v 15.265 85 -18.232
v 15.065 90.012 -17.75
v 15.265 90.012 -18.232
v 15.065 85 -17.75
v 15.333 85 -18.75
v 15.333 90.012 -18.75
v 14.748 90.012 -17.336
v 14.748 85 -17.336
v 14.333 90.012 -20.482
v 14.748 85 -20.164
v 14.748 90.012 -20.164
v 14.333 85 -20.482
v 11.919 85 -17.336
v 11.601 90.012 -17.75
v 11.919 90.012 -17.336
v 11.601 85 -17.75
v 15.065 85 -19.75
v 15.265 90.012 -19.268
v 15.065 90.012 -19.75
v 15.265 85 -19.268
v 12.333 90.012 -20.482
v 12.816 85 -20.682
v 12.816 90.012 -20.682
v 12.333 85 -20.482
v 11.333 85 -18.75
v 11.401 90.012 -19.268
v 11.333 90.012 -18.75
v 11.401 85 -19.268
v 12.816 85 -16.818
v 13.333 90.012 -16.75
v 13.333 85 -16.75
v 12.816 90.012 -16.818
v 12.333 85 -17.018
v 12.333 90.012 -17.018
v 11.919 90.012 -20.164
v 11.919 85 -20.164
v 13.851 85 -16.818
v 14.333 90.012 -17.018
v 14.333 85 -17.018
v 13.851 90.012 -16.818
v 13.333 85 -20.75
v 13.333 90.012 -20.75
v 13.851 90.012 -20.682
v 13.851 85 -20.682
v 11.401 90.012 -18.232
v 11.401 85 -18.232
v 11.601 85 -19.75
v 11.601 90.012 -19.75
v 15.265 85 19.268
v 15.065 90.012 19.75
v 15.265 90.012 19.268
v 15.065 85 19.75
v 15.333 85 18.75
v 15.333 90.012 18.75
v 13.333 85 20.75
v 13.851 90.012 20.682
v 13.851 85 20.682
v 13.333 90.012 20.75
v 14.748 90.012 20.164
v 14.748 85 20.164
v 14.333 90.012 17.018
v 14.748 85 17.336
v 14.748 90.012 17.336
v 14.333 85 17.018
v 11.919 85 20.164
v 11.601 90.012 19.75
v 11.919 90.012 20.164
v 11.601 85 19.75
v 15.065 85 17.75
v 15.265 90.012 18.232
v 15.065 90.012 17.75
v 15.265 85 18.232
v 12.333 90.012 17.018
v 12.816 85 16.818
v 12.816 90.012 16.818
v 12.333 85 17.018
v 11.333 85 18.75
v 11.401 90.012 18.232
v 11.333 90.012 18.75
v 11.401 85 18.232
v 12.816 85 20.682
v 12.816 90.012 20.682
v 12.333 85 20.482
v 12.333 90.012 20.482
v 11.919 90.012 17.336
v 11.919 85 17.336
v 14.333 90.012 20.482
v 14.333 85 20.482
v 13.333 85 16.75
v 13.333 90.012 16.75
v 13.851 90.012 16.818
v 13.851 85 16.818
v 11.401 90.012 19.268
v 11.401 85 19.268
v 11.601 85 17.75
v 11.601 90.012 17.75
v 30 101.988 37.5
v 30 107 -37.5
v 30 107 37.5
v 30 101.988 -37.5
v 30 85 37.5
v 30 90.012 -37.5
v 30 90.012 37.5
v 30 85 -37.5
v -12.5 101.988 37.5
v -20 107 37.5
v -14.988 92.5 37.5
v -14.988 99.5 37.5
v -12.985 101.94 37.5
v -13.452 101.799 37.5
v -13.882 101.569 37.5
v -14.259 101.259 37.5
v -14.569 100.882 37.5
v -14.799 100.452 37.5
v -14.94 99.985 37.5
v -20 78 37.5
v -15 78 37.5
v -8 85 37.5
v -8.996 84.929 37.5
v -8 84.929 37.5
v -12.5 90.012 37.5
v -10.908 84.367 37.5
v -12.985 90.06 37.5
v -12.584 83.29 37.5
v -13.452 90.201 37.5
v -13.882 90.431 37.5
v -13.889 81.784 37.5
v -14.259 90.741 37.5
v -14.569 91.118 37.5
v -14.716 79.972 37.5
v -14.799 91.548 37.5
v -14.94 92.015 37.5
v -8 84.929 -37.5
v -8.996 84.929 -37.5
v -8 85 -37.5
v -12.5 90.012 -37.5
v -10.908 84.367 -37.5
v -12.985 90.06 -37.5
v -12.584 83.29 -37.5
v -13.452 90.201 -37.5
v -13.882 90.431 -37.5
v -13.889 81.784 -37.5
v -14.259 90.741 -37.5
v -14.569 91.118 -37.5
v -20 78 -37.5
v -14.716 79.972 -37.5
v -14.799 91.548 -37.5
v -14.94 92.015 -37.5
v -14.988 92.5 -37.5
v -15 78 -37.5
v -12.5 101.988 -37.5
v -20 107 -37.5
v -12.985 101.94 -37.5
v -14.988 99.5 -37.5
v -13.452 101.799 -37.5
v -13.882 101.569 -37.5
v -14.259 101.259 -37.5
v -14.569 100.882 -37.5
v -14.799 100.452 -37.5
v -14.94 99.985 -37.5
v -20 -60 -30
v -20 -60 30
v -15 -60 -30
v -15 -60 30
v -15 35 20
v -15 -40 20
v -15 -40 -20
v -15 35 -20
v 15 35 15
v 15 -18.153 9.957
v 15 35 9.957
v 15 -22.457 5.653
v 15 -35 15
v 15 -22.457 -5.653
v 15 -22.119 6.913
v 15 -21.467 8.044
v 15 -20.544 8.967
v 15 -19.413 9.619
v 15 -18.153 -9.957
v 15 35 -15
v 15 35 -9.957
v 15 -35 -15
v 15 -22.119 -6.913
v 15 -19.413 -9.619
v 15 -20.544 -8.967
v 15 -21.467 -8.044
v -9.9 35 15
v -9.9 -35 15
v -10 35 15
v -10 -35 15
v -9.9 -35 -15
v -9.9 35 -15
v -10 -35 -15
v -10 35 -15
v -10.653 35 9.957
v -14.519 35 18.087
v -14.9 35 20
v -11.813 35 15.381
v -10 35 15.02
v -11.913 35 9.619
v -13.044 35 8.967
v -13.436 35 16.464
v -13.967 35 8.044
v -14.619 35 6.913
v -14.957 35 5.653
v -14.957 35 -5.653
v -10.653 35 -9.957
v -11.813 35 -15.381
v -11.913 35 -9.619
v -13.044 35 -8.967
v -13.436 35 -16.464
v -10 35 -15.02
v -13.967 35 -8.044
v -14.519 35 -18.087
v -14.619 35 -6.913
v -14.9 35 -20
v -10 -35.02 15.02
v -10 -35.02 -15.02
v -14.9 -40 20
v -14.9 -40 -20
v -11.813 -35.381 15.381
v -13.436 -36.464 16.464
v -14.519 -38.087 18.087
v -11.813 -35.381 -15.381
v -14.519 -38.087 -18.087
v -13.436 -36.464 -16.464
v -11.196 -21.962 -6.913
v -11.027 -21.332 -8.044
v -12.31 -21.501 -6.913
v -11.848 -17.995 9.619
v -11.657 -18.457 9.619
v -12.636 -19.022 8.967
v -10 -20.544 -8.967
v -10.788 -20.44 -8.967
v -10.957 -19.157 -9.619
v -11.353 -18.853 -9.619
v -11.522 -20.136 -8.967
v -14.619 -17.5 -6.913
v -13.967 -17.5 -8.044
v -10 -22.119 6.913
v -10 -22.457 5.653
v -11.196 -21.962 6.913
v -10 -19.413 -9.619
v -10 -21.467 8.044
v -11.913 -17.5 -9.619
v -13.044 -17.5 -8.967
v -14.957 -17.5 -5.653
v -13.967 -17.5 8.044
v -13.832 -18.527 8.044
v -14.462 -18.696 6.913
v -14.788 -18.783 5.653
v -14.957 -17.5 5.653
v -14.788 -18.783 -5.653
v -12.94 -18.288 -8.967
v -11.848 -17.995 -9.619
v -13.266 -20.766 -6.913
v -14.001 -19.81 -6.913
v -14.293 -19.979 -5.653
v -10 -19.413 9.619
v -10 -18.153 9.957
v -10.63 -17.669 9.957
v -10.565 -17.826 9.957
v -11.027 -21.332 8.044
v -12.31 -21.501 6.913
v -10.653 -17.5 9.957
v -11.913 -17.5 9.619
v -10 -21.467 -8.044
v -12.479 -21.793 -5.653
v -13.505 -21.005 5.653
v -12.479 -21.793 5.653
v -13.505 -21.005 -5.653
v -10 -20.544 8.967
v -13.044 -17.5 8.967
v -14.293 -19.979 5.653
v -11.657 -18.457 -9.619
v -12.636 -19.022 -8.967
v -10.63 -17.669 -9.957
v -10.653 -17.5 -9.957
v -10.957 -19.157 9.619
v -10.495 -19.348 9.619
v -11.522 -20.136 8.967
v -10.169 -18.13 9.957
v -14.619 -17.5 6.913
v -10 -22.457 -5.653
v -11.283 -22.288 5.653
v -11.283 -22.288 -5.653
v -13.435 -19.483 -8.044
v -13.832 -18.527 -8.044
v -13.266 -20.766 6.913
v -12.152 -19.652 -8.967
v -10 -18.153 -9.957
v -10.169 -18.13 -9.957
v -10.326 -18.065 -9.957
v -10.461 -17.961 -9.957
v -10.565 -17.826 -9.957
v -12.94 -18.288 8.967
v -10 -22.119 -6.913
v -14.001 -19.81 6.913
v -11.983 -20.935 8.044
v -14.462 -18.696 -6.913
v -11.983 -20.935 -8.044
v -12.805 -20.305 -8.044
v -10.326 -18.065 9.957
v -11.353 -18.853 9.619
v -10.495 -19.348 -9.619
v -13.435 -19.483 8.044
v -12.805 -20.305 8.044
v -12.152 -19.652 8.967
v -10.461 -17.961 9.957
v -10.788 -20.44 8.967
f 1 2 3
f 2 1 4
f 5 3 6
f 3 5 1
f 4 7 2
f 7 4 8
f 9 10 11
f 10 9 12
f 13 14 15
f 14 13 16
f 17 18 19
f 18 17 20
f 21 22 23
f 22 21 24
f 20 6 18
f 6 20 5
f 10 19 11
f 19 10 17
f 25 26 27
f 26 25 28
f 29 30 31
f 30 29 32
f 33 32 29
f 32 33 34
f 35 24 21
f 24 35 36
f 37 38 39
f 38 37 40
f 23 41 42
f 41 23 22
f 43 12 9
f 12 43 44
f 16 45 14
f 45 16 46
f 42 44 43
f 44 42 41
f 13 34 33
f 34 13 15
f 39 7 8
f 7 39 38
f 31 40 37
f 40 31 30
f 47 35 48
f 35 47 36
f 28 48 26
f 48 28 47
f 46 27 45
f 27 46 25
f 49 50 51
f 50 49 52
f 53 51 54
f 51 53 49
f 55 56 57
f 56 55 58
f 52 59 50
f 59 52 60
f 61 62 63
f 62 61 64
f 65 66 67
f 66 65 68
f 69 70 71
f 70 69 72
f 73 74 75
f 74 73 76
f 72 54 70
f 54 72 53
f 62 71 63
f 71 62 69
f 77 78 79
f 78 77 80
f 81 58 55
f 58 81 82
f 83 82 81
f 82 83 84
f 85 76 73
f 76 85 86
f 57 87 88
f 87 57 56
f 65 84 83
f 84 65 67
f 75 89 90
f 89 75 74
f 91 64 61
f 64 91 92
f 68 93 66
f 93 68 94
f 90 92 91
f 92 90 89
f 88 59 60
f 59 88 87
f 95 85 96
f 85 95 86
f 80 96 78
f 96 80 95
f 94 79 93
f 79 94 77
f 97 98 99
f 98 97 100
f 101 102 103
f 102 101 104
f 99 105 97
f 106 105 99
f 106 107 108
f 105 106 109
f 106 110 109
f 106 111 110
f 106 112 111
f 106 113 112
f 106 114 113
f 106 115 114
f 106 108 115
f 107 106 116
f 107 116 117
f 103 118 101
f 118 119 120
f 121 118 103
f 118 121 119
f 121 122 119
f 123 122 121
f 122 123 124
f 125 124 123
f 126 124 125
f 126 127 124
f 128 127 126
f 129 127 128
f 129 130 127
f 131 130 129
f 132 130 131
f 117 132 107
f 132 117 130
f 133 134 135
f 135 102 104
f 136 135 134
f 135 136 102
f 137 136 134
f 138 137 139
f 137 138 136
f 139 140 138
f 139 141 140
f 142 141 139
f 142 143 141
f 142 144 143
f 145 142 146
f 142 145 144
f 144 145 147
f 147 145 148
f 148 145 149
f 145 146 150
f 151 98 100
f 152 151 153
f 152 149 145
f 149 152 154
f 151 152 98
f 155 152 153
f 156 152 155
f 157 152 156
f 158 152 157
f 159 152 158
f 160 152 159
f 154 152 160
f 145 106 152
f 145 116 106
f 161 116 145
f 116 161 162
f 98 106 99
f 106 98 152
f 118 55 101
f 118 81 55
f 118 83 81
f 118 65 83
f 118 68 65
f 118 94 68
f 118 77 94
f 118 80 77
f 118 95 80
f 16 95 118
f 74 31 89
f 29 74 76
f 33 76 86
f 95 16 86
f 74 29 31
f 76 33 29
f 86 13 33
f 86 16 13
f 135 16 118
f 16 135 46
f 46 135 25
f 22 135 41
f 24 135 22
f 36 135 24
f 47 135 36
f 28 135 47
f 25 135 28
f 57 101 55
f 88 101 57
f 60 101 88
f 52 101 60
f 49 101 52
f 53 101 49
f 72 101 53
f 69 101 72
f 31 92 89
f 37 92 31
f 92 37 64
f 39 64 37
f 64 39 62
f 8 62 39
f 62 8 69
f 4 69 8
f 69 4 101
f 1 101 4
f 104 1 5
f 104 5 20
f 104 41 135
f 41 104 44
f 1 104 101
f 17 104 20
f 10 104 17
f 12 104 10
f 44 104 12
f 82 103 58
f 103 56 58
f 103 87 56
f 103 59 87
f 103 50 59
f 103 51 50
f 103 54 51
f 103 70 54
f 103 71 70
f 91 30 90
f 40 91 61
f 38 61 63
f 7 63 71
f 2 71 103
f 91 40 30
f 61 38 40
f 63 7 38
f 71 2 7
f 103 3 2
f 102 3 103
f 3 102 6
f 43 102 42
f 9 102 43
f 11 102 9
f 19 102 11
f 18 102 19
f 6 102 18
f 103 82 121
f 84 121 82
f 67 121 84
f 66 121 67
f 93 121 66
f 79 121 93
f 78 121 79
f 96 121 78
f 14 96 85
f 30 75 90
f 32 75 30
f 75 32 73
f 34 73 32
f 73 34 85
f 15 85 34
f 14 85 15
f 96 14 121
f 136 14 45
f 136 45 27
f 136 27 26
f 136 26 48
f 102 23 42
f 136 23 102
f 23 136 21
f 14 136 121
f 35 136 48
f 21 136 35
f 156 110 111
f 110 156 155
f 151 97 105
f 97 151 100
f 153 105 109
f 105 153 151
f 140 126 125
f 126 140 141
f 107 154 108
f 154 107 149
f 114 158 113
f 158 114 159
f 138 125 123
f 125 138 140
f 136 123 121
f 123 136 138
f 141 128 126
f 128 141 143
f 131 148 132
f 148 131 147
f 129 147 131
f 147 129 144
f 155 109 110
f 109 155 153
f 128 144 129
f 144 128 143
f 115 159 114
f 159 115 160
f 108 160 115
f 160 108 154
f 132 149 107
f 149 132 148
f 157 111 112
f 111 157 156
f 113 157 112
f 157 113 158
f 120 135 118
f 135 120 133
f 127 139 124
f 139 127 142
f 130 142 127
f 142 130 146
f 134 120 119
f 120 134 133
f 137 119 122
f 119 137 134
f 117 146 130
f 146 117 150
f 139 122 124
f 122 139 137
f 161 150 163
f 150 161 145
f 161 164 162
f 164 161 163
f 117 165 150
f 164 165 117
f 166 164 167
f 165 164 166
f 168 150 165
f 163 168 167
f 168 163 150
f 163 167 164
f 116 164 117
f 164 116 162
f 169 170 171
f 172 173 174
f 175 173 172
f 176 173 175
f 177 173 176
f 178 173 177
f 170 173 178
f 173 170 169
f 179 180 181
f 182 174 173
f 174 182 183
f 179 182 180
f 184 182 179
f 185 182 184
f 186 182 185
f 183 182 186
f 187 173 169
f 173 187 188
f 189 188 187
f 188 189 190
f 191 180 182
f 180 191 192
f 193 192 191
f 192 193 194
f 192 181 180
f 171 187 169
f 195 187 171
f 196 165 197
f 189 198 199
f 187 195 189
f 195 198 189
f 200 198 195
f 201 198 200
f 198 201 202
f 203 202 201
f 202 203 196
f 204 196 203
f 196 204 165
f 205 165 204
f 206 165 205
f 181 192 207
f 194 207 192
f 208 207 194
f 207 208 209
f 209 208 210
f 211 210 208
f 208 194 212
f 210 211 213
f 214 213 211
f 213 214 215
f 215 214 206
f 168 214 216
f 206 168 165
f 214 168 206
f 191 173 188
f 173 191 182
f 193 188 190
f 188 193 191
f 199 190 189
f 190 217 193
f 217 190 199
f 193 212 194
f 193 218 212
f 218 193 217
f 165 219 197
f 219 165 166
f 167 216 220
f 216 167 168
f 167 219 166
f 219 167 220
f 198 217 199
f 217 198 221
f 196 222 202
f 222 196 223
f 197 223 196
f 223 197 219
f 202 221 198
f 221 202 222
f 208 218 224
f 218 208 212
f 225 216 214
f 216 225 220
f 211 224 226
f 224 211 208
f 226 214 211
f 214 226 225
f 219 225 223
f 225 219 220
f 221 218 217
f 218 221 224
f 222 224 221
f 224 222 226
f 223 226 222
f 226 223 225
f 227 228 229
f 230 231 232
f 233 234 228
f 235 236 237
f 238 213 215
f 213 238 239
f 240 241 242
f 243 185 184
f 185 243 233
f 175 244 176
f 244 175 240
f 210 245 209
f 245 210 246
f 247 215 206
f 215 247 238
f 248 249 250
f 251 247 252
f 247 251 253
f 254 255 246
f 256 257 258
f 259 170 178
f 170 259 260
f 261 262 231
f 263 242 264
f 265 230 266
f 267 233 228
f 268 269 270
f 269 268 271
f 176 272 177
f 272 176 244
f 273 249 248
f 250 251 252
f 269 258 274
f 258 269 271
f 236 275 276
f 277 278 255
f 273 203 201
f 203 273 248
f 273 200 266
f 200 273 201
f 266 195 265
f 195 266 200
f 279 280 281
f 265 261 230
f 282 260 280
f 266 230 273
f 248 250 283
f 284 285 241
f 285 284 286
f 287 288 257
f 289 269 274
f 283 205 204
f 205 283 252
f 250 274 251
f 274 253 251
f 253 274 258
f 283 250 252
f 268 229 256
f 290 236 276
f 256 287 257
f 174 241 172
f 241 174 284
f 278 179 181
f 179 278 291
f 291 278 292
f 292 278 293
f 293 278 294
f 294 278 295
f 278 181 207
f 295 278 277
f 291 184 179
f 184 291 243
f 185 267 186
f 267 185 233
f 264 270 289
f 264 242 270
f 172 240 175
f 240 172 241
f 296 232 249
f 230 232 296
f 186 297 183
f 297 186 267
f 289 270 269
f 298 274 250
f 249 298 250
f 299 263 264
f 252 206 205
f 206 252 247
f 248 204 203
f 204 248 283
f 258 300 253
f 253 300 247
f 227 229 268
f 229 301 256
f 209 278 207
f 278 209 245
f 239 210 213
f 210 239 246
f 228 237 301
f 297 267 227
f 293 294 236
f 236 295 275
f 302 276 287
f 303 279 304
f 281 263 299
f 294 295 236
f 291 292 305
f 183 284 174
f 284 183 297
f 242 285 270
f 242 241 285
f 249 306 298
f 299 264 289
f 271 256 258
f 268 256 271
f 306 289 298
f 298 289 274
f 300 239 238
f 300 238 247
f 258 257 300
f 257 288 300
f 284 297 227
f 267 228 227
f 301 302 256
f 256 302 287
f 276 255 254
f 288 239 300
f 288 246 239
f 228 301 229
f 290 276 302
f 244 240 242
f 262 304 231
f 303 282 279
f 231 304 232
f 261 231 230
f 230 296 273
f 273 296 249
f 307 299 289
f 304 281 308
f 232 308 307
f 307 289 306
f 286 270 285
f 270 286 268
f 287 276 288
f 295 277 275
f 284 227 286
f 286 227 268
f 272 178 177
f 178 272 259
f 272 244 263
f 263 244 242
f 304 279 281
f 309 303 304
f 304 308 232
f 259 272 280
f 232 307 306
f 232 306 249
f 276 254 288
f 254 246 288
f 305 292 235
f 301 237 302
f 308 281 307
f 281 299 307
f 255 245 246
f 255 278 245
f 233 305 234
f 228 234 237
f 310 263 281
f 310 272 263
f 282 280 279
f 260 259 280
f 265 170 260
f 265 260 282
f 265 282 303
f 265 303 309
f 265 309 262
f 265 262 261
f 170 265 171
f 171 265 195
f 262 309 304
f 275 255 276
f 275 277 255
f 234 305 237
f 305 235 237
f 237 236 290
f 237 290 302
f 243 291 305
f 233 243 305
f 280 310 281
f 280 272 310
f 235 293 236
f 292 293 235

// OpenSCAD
/*  EasyShelves. Pole hanger Generator. Enables users of the Moidules
    modules to create a customized pole hanger. The design is simple in order to be easilly printable.
    EasyShelves is Not Moidules.
    Copyright (C) 2015  PMorel for Thilab (www.thilab.fr)

    This program is free software: you can redistribute it and/or modify
    it under the terms of the GNU General Public License as published by
    the Free Software Foundation, either version 3 of the License, or
    (at your option) any later version.

    This program is distributed in the hope that it will be useful,
    but WITHOUT ANY WARRANTY; without even the implied warranty of
    MERCHANTABILITY or FITNESS FOR A PARTICULAR PURPOSE.  See the
    GNU General Public License for more details.

    You should have received a copy of the GNU General Public License
    along with this program.  If not, see <http://www.gnu.org/licenses/>.
*/

//Thickness of the walls
wall_thickness=5;
//Distance between the top of the pole hanger and the bottom of the bracket
polehanger_distance_from_top=50;
//Radius of the pole that must fit in this pole hanger
pole_radius = 10;
//Height of the pole hanger
polehanger_height=70;
//Depth of the pole hanger
polehanger_depth=30;
//Solid bottom part of the pole hanger
polehanger_solid_part_bottom=10;
//Thickness of the wood
wood_thickness=12;
//Depth of the bracket
depth=50;
//Screws
number_of_screws = 2; //[0,1,2]
//Screw diameter
screw_diameter = 4; //[1:12]
//Top screws
top_screws = "no";
//Inner screws
inner_screws= "yes";

/* [Hidden] */
// The height of the bracket
hCube = wood_thickness+2*wall_thickness;
// Width of the pole hanger
polehanger_width=pole_radius*2+wall_thickness*2;
// Height of the piece that supports the pole hanger
support_height=polehanger_distance_from_top+polehanger_height+polehanger_distance_from_top/2;
// Width of the support at the top near the bracket
support_width_top=polehanger_width*2.5;
// Width of the support at the bottom
support_width_bottom=polehanger_width*2;
// length of the bracket 
front_side_length = support_width_top;
//Fillet of the pole hanger
fillet_size = 5;
//Fillet inside the bracket
board_fillet_size=0.5;
//Fillet between the bracket and the support
link_fillet=7;


//Main module
poleHanger();


// This module creates the complete pole hanger. 
module poleHanger() {
   union() {
        translate([0,-support_height/2+polehanger_height/2 + polehanger_distance_from_top , 0])
        union() {
            //The support of the hanger
            translate([-polehanger_depth/2-wall_thickness,support_height/2-link_fillet,-support_width_top/2]) rotate([90,-90,90]) trapezoid(support_width_top, support_width_bottom, support_height-link_fillet,wall_thickness);
            // Create the bracket
            translate([-polehanger_depth/2-wall_thickness,support_height/2,-support_width_top/2]) 
                difference() {
                    bracket(inner_screws,top_screws,0);
                    translate([wall_thickness,wall_thickness,0]) 
                        boardH(0);
                }
            //Add a fillet between the support and the bracket
                translate([-polehanger_depth/2-wall_thickness,support_height/2-link_fillet,-support_width_top/2]) {
                difference() {
                    cube([link_fillet+wall_thickness,link_fillet,support_width_top]);
                    translate([link_fillet+wall_thickness,0,-0.1]) cylinder(r=link_fillet, h=support_width_top+1);
                }
            }
        }        
        // Create the hanger
        createHanger();
    }
}

module createHanger() {
    sphere_radius = pole_radius*0.5;
    internal_cube_width=pole_radius*2 - 2*sphere_radius;
    difference() {

        difference() {

           union() {
               //the main cube that forms the coat_hanger
                cube([polehanger_depth,polehanger_height,polehanger_width],true);
                //the cube used to create a fillet between the main cube and the support
                translate([-polehanger_depth/2+fillet_size/2,-fillet_size/2,0]) cube([fillet_size,polehanger_height+fillet_size,polehanger_width+fillet_size*2],true);
           }
           
           union() {
               // First cylinder for the fillet
                translate([-polehanger_depth/2+fillet_size+0.1,0,polehanger_width/2+fillet_size]) rotate([90,0,0]) cylinder(r=fillet_size,h=80,center=true);
               // Second cylinder for the fillet 
                translate([-polehanger_depth/2+fillet_size+0.1,0,-polehanger_width/2-fillet_size]) rotate([90,0,0]) cylinder(r=fillet_size,h=80,center=true);
                // Third cylinder for the fillet
                translate([-polehanger_depth/2+fillet_size+0.1,-polehanger_height/2-fillet_size,0]) rotate([0,0,0]) cylinder(r=fillet_size,h=80,center=true);
               // The shape that forms the hole for the coat hanger pole
                
               translate([sphere_radius,sphere_radius/2+polehanger_solid_part_bottom,0])
                    minkowski() {
                        sphere($fn=24,r=sphere_radius);
                        cube([polehanger_depth,polehanger_height-polehanger_solid_part_bottom,internal_cube_width],true);
                    }
           }
       }
    }
}

// Create a trapezoid
module trapezoid(width_base, width_top,height,thickness) {
    linear_extrude(height = thickness) polygon(points=[[0,0],[width_base,0],[width_base-(width_base-width_top)/2,height],[(width_base-width_top)/2,height]], paths=[[0,1,2,3]]);
}

module boardH( shift ) {
    sphere_radius = board_fillet_size*wall_thickness;
    board_cube_thickness = wood_thickness-sphere_radius*2;
    translate([sphere_radius,sphere_radius,0])
        minkowski() {
            sphere($fn=32, r=sphere_radius);
            cube([depth, board_cube_thickness, front_side_length]);
            }
}

// Draw the bracket shape
module bracket( left_screws, right_screws, shift) {
        rotate([0,0,0]) {
            difference() {
                cube([depth,hCube,front_side_length]);
                
                //Draw the inner screws
                if( left_screws == "yes" ) {
                    width = wall_thickness;
                    height = front_side_length;
                    if( number_of_screws == 1 ) { 
                      translate([depth*2/3,wall_thickness+0.1,front_side_length/2]) rotate([90,0,0]) cylinder($fn=24, r=screw_diameter/2, h=width+2);                
                    } else if(number_of_screws == 2) {
                      translate([depth*2/3,wall_thickness+0.1,front_side_length/4]) rotate([90,0,0]) cylinder($fn=24, r=screw_diameter/2, h=width+2);                
                      translate([depth*2/3,wall_thickness+0.1,front_side_length*3/4]) rotate([90,0,0]) cylinder($fn=24, r=screw_diameter/2, h=width+2);             
                    }
                }
                //Draw the top screws
                if( right_screws == "yes" ) {
                    width = wall_thickness;
                    screw_shift = wall_thickness*2 + wood_thickness + 1;
                    height = front_side_length;
                    if( number_of_screws == 1 ) { 
                      translate([depth*2/3,screw_shift+0.1,front_side_length/2]) rotate([90,0,0]) cylinder($fn=24, r=screw_diameter/2, h=width+2);                
                    } else if(number_of_screws == 2) {
                      translate([depth*2/3,screw_shift+0.1,front_side_length/4]) rotate([90,0,0]) cylinder($fn=24, r=screw_diameter/2, h=width+2);                
                      translate([depth*2/3,screw_shift+0.1,front_side_length*3/4]) rotate([90,0,0]) cylinder($fn=24, r=screw_diameter/2, h=width+2);             
                    }
                }
           }
       }
}
